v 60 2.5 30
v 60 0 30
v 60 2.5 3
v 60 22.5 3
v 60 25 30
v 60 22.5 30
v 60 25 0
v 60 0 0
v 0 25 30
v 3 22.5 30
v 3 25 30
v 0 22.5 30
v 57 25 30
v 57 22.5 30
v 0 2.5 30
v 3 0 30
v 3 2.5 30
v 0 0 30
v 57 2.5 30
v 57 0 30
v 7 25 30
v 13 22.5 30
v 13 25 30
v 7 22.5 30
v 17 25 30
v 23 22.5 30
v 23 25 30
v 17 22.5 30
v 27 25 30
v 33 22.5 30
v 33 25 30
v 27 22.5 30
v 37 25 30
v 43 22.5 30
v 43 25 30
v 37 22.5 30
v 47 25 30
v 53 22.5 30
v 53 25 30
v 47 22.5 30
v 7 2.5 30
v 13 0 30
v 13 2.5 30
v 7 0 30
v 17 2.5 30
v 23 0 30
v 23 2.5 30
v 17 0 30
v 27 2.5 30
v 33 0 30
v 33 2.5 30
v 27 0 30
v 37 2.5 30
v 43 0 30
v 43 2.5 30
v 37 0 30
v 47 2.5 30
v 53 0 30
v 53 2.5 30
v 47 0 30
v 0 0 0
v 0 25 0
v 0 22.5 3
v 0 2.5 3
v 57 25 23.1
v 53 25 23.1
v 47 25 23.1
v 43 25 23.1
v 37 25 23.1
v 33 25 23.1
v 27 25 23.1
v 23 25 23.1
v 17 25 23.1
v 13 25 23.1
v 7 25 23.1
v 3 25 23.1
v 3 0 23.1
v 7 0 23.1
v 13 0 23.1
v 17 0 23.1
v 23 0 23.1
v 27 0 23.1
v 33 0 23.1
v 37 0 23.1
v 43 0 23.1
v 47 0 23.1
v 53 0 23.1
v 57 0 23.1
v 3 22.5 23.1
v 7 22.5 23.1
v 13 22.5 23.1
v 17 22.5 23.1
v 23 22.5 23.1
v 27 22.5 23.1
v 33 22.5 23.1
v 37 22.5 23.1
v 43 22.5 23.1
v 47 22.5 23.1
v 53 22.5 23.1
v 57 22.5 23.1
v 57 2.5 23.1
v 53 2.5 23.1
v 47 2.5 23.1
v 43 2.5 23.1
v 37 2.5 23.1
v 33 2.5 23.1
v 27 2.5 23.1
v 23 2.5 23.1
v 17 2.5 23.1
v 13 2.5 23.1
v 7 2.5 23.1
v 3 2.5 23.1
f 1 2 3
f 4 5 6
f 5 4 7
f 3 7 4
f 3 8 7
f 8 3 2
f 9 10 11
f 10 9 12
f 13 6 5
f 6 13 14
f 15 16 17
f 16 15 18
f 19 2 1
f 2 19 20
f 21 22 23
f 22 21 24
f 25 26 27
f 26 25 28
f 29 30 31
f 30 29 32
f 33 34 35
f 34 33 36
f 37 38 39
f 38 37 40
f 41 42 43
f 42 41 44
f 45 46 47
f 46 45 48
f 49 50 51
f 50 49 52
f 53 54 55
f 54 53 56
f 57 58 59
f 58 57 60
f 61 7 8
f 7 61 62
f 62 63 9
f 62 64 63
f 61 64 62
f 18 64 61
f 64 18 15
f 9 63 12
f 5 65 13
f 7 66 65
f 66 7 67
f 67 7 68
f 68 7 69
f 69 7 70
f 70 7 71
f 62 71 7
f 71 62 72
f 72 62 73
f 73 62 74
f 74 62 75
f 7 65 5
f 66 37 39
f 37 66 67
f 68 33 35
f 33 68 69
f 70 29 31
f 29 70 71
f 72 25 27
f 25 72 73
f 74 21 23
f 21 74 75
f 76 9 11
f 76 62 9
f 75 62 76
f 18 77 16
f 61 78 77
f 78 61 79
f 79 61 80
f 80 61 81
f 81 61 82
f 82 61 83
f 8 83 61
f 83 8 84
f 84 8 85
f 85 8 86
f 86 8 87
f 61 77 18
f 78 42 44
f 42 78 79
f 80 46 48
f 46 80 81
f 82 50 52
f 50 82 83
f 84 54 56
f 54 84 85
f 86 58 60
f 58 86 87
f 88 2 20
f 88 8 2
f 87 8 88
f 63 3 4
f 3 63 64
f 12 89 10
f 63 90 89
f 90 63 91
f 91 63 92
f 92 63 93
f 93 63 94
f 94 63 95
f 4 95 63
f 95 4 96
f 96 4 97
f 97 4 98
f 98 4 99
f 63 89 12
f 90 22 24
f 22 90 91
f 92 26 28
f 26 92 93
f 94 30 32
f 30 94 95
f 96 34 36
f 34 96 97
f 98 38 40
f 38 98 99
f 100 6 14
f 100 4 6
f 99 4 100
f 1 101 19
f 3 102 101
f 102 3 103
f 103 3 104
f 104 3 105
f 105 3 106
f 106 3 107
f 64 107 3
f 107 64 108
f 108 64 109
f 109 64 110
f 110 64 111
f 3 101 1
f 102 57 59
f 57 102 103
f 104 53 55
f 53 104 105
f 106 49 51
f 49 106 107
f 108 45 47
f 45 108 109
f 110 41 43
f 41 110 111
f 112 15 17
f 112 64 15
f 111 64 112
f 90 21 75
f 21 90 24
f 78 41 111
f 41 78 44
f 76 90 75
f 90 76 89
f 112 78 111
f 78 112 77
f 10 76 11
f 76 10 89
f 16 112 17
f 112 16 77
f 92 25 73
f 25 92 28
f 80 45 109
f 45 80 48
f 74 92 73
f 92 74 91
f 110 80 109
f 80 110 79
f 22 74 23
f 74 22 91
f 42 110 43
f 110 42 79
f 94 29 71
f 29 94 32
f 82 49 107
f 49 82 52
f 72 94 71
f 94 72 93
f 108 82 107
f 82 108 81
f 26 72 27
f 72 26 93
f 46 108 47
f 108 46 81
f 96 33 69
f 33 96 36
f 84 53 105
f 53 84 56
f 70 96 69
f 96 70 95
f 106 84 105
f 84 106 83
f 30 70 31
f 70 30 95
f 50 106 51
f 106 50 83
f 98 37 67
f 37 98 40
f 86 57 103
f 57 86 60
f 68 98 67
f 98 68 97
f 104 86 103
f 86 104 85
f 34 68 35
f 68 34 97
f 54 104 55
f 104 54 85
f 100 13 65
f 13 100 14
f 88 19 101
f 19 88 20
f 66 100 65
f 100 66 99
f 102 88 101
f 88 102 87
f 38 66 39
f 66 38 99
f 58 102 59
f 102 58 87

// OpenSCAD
$fn = 32;

// ----------------------------------------------------------------------
// Cable duct: 60 x 25 x 30 mm, 6 fingers
// ----------------------------------------------------------------------

// --- parameters (mm) ---
channel_l = 60;           // duct length, X
channel_w = 25;           // duct width, Y
channel_h = 30;           // duct height, Z
channel_t = 2.5;          // side wall thickness
floor_t = 3;              // floor thickness
slot_w = 4;               // finger slot width
slot_h = 20.1;            // finger slot height
fingers = 6;              // number of finger slots per side
pitch = 10;               // finger pitch

module shell() {
  difference() {
    cube([channel_l, channel_w, channel_h]);
    /* open top channel */
    translate([-channel_t - 1, channel_t, floor_t])
      cube([channel_l + 2 * channel_t + 2, channel_w - 2 * channel_t, channel_h + 1]);
  }
}

difference() {
  union() {
    shell();
  }
  /* finger slots cut through both side walls */
  for (i = [0 : fingers - 1]) translate([pitch / 2 + i * pitch - slot_w / 2, -1, floor_t + slot_h]) cube([slot_w, channel_w + 2, channel_h]);
}
